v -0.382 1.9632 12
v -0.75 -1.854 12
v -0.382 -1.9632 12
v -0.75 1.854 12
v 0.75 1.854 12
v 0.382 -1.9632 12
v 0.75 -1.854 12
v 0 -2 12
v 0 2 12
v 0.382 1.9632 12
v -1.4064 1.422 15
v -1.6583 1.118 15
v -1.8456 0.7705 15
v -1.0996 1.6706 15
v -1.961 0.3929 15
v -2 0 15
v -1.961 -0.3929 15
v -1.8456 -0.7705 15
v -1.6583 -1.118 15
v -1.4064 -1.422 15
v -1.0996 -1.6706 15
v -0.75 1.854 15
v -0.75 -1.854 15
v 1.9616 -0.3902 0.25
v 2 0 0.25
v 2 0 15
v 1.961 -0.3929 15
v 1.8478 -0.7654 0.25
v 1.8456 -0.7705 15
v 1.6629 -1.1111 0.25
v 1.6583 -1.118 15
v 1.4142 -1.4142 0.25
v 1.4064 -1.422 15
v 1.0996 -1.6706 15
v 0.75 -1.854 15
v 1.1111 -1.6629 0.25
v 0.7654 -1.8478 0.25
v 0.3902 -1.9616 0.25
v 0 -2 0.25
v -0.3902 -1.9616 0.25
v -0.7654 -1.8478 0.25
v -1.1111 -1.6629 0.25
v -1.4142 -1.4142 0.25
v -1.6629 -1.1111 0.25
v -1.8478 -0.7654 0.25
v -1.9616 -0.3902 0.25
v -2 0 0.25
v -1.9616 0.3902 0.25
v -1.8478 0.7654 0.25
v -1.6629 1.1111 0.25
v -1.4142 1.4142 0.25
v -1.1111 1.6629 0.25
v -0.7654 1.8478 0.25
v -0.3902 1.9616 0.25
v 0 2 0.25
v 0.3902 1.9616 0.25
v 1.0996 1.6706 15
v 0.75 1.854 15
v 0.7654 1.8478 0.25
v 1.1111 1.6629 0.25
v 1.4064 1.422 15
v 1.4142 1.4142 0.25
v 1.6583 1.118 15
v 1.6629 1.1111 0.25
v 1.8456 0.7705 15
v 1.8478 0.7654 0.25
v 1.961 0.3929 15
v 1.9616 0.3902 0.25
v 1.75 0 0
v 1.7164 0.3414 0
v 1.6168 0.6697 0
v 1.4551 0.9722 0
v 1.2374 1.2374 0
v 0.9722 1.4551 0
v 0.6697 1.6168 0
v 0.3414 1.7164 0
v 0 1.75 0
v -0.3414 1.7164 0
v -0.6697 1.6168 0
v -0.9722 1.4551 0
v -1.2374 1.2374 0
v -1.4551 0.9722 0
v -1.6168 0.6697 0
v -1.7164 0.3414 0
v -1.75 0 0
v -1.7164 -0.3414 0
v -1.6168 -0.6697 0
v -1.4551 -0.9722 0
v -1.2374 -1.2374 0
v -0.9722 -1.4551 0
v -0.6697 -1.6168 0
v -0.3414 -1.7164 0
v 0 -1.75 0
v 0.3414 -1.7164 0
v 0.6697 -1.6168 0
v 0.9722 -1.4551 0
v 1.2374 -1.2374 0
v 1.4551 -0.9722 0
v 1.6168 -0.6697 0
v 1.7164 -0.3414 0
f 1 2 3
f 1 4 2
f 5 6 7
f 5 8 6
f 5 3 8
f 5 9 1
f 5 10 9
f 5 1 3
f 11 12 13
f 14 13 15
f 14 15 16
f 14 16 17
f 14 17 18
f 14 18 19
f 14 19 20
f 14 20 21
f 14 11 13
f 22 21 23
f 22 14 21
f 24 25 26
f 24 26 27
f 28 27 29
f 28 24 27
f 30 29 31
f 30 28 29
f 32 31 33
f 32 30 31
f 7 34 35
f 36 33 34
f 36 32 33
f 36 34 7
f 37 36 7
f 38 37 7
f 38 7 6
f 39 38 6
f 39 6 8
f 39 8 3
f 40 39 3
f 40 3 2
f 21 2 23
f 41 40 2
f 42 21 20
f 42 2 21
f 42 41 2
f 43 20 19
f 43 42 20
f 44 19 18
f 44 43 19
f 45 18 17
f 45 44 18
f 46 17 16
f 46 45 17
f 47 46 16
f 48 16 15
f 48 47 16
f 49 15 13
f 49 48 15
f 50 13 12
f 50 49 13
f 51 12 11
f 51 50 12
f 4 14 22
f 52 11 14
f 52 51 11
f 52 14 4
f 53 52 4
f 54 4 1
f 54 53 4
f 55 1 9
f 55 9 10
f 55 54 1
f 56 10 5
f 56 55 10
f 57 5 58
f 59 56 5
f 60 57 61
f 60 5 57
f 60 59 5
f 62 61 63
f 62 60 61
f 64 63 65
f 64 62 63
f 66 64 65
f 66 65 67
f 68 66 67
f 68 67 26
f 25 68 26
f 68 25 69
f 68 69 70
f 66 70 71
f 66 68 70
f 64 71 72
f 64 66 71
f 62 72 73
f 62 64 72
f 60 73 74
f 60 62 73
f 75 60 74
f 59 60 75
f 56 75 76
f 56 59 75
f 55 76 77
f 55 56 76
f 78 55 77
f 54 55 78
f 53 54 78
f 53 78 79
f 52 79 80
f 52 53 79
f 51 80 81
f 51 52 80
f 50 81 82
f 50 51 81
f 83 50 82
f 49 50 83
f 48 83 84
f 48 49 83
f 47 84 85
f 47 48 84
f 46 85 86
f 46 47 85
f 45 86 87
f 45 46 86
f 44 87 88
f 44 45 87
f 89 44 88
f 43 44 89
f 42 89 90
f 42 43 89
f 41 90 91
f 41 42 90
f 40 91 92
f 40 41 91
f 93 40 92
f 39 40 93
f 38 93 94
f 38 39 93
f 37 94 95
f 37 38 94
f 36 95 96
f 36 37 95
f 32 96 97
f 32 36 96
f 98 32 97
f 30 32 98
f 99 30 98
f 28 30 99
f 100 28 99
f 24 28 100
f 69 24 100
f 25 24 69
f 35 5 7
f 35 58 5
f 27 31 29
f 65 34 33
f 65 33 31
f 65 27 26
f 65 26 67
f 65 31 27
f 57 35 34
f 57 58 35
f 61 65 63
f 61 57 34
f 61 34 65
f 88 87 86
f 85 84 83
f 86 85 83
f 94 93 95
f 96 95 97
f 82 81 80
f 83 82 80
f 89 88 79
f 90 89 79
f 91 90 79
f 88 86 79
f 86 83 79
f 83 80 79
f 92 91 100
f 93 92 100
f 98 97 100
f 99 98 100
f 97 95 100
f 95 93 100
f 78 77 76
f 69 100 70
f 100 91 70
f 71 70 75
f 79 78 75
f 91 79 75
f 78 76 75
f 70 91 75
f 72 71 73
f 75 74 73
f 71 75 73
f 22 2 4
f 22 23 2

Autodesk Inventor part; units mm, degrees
ref_plane "YZ Plane" through (0, 0, 0) normal (1, 0, 0) x (0, 1, 0)
ref_plane "XZ Plane" through (0, 0, 0) normal (0, 1, 0) x (-1, 0, 0)
ref_plane "XY Plane" through (0, 0, 0) normal (0, 0, 1) x (1, 0, 0)
sketch "草图1" plane through (0, 0, 0) normal (0, 0, 1) x (1, 0, 0)
  circle A0 centre (0, 0) radius 2
  dimension "d0" = 4
extrude "拉伸1" add sketch "草图1" along normal blind 15
sketch "草图2" plane through (0, 0, 15) normal (0, 0, 1) x (1, 0, 0)
  line L0 (-0.75, 2) -> (0.75, 2)
  line L1 (0.75, 2) -> (0.75, -2)
  line L2 (0.75, -2) -> (-0.75, -2)
  line L3 (-0.75, -2) -> (-0.75, 2)
  line L4 (0, 0) -> (0, 2)
  circle A0 centre (0, 0) radius 2 projected
  dimension "d3" = 1.5
extrude "拉伸2" cut sketch "草图2" against normal blind 3 contours L0 A0 L3 | L0 L1 A0 | A0 L1 L3 | A0 L2 L3 | L1 L2 A0
thread "螺纹1" size "M4x0.7" class "6g" standard "ANSI Metric M Profile" full length
chamfer "倒角1" distance 0.25 angle 45 1 edges at (-2, 0, 0)
properties part number "砂轮电机皮带轮固定螺丝"
